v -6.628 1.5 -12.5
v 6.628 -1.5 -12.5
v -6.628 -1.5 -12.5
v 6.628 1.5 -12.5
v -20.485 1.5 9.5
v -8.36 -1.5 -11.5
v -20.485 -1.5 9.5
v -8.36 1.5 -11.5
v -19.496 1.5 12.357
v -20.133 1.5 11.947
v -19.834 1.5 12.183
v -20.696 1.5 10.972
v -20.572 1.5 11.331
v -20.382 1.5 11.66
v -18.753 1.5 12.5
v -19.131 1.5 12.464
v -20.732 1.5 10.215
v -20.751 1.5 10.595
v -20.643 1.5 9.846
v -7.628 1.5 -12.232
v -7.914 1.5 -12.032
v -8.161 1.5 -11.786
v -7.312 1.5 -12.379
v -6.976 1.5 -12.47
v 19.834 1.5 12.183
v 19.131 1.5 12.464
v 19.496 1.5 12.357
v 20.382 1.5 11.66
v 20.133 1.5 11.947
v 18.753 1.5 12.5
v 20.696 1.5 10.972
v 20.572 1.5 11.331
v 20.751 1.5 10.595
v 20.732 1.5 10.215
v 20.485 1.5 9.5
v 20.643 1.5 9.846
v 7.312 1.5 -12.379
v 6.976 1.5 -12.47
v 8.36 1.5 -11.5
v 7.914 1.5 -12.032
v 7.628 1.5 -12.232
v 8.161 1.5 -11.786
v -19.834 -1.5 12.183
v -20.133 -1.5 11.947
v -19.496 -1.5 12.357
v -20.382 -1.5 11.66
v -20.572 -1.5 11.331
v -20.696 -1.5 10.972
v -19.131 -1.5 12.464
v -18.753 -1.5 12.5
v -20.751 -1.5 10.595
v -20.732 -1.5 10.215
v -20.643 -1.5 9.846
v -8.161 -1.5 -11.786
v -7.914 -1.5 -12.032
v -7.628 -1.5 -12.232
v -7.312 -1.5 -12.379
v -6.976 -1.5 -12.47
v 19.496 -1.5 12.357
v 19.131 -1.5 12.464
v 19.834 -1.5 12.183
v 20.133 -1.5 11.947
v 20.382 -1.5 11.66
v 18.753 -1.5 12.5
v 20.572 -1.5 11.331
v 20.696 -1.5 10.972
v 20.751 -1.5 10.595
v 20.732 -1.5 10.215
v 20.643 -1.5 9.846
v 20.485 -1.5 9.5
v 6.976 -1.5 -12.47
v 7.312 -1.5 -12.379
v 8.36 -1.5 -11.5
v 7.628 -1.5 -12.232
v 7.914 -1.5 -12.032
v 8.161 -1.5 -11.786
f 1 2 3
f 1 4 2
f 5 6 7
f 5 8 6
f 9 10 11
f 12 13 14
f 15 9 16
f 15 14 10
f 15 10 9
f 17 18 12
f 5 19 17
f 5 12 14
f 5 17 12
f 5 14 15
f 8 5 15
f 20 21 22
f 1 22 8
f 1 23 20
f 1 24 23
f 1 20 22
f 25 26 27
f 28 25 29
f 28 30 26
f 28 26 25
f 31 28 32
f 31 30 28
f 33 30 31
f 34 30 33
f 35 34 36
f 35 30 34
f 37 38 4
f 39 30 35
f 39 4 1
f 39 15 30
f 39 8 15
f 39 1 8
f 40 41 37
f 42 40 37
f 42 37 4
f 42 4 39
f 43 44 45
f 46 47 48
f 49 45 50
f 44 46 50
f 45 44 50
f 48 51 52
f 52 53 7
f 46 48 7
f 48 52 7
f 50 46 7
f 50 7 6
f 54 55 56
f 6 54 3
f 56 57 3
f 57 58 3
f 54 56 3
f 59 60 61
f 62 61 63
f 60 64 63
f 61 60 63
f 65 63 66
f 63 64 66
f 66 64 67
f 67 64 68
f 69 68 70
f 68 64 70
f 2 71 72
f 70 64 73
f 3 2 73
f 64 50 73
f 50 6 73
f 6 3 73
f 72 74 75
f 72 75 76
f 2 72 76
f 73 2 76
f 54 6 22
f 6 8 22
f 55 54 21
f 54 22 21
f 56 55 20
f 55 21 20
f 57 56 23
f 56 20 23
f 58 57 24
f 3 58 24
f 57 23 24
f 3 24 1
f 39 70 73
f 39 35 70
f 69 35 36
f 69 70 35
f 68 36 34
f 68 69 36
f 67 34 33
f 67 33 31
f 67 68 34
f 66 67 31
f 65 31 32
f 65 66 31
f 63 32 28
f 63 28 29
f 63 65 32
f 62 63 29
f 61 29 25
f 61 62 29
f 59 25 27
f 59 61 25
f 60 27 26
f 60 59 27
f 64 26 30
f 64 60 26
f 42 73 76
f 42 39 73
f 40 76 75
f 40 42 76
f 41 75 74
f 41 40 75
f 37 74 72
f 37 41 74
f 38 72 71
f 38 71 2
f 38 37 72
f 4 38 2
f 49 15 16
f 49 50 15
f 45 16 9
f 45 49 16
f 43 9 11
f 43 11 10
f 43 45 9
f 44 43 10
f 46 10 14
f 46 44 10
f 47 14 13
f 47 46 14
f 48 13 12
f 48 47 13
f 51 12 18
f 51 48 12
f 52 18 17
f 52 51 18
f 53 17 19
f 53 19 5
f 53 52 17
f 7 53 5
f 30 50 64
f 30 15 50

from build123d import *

# Parameters (mm, degrees)
BOSS_EXTRUDE1_DEPTH = 1.5
FILLET5_R           = 2


with BuildPart() as part:
    # Sketch1 → Boss-Extrude1 (new, symmetric)
    with BuildSketch(Plane(origin=(0, 0, 0), x_dir=(1, 0, 0), z_dir=(0, 1, 0))):
        Polygon((-14.297771125, -12.5), (14.297771125, -12.5), (22.216878365, -12.5), (7.783121635, 12.5), (-7.783121635, 12.5), (-22.216878365, -12.5), align=None)
    extrude(amount=BOSS_EXTRUDE1_DEPTH, both=True)

    # Fillet5
    fillet5_edges = [part.edges().sort_by_distance(p)[0] for p in [
        (-22.216878365, 0, 12.5),
        (-7.783121635, 0, -12.5),
        (7.783121635, 0, -12.5),
        (22.216878365, 0, 12.5),
    ]]
    fillet(fillet5_edges, radius=FILLET5_R)


solid = part.part
